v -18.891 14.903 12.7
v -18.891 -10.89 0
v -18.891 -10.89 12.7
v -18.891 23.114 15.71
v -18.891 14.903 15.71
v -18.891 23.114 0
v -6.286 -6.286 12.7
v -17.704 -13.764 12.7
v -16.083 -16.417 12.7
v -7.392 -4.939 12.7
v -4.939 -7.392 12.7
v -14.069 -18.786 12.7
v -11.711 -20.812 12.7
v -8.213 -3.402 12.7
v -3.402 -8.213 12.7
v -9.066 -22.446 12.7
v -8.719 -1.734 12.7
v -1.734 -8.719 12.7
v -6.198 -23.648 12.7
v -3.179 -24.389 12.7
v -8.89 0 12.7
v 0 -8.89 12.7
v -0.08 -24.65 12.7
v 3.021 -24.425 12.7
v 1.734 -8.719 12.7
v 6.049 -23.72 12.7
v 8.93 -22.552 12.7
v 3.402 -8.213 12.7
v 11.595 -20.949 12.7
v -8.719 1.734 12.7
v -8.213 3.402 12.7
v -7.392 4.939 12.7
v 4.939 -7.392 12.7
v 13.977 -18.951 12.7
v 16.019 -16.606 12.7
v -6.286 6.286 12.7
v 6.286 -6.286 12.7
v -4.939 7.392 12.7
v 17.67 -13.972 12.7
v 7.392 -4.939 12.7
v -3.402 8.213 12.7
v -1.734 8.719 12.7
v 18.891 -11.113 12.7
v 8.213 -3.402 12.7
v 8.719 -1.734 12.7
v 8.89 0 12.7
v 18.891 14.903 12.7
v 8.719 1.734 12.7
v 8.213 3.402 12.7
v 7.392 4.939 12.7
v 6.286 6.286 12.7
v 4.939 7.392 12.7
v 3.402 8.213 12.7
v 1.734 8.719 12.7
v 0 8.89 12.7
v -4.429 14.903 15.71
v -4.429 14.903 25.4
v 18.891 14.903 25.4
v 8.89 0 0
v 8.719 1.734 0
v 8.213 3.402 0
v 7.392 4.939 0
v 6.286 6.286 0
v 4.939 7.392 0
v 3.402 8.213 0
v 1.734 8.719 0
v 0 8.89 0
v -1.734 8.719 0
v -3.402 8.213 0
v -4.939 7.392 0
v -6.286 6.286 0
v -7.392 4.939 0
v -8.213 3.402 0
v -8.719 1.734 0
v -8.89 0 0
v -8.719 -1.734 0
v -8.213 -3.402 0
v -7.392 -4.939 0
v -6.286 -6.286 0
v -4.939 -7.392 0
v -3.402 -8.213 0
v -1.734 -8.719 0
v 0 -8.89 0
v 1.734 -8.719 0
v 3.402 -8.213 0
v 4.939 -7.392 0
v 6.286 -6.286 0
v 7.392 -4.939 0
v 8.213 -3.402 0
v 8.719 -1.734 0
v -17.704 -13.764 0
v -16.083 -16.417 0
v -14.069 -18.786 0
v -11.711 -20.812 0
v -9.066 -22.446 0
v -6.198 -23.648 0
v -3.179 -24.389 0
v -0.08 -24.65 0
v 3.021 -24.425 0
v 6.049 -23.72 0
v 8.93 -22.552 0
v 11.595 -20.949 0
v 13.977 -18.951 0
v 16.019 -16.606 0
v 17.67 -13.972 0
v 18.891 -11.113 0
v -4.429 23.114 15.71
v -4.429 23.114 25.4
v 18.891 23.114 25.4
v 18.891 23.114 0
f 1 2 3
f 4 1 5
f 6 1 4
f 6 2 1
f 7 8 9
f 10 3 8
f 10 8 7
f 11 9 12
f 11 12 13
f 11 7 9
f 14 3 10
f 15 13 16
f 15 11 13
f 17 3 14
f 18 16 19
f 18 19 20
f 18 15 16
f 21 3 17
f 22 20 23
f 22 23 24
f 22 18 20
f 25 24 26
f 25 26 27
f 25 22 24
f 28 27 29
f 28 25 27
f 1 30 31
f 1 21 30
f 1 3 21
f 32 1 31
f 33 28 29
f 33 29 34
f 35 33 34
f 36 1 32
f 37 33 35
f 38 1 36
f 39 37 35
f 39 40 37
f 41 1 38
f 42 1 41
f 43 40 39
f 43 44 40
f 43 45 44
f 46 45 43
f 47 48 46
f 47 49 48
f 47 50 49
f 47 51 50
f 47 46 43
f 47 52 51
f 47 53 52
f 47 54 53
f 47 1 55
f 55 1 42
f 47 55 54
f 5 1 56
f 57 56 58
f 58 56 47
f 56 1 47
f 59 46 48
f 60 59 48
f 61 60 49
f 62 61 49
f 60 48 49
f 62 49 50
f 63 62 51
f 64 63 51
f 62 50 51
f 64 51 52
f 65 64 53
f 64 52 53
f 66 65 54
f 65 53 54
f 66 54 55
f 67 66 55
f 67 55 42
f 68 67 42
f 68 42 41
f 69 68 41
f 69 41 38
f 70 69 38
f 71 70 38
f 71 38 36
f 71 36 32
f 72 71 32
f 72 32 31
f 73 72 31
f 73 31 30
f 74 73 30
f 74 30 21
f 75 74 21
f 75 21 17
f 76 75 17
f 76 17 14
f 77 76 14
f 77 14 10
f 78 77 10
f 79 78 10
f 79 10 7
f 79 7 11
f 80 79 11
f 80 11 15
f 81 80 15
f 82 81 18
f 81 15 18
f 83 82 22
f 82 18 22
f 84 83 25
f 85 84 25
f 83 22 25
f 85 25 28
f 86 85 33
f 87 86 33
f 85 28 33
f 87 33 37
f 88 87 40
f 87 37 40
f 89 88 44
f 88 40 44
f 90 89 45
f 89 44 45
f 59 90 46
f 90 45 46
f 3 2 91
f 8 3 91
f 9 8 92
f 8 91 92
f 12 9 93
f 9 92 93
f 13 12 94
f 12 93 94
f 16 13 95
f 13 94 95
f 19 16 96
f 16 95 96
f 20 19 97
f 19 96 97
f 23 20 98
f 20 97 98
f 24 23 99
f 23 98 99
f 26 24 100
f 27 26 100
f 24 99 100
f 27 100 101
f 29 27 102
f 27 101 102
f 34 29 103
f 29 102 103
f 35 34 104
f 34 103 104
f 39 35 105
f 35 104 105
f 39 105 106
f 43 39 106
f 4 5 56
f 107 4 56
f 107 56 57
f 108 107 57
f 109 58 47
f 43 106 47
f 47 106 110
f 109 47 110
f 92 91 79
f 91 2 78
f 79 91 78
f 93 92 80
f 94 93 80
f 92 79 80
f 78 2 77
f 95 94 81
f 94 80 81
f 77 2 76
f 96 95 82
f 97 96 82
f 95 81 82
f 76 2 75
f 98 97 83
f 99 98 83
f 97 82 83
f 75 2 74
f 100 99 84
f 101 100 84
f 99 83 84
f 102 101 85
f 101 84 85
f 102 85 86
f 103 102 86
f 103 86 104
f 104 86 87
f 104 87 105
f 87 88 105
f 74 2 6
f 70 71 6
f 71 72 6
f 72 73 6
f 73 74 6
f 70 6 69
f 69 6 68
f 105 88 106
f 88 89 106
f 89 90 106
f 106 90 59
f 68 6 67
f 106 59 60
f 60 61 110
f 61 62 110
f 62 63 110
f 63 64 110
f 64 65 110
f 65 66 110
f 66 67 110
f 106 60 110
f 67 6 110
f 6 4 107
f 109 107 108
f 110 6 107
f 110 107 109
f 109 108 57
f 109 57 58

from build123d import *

# Parameters (mm, degrees)
F1_DEPTH = 12.7
F2_W     = 37.782497704
F2_H     = 8.2107339986
F3_DEPTH = 12.7
F4_W     = 14.4625585526
F4_H     = 9.6896222413
F5_DEPTH = 8.2117339986
F6_R     = 8.89
F7_DEPTH = 12.701


with BuildPart() as f1:
    # F0 (on Top) → F1 (new body)
    with BuildSketch(Plane.XY):
        with BuildLine():
            Line((18.891248852, -11.1125009134), (18.891248852, 23.1139999814))
            Line((18.891248852, 23.1139999814), (-18.891248852, 23.1139999814))
            Line((-18.891248852, 23.1139999814), (-18.891248852, -10.8902500942))
            ThreePointArc((-18.891248852, -10.8902500942), (-0.0802847481, -24.6497315476), (18.891248852, -11.1125009134))
        make_face()
    extrude(amount=F1_DEPTH)

    # F2 (on face) → F3 (join)
    with BuildSketch(Plane.XY.offset(12.7)):
        with Locations((0, 19.0086329821)):
            Rectangle(F2_W, F2_H)
    extrude(amount=F3_DEPTH)

    # F4 (on face) → F5 (cut, through all)
    with BuildSketch(Plane.XZ.offset(-14.9032659829)):
        with Locations((-11.6599695757, 20.5551888794)):
            Rectangle(F4_W, F4_H)
    extrude(amount=-F5_DEPTH, mode=Mode.SUBTRACT)

    # F6 (on face) → F7 (cut, through all)
    with BuildSketch(Plane.XY.offset(12.7)):
        Circle(F6_R)
    extrude(amount=-F7_DEPTH, mode=Mode.SUBTRACT)


solid = f1.part
